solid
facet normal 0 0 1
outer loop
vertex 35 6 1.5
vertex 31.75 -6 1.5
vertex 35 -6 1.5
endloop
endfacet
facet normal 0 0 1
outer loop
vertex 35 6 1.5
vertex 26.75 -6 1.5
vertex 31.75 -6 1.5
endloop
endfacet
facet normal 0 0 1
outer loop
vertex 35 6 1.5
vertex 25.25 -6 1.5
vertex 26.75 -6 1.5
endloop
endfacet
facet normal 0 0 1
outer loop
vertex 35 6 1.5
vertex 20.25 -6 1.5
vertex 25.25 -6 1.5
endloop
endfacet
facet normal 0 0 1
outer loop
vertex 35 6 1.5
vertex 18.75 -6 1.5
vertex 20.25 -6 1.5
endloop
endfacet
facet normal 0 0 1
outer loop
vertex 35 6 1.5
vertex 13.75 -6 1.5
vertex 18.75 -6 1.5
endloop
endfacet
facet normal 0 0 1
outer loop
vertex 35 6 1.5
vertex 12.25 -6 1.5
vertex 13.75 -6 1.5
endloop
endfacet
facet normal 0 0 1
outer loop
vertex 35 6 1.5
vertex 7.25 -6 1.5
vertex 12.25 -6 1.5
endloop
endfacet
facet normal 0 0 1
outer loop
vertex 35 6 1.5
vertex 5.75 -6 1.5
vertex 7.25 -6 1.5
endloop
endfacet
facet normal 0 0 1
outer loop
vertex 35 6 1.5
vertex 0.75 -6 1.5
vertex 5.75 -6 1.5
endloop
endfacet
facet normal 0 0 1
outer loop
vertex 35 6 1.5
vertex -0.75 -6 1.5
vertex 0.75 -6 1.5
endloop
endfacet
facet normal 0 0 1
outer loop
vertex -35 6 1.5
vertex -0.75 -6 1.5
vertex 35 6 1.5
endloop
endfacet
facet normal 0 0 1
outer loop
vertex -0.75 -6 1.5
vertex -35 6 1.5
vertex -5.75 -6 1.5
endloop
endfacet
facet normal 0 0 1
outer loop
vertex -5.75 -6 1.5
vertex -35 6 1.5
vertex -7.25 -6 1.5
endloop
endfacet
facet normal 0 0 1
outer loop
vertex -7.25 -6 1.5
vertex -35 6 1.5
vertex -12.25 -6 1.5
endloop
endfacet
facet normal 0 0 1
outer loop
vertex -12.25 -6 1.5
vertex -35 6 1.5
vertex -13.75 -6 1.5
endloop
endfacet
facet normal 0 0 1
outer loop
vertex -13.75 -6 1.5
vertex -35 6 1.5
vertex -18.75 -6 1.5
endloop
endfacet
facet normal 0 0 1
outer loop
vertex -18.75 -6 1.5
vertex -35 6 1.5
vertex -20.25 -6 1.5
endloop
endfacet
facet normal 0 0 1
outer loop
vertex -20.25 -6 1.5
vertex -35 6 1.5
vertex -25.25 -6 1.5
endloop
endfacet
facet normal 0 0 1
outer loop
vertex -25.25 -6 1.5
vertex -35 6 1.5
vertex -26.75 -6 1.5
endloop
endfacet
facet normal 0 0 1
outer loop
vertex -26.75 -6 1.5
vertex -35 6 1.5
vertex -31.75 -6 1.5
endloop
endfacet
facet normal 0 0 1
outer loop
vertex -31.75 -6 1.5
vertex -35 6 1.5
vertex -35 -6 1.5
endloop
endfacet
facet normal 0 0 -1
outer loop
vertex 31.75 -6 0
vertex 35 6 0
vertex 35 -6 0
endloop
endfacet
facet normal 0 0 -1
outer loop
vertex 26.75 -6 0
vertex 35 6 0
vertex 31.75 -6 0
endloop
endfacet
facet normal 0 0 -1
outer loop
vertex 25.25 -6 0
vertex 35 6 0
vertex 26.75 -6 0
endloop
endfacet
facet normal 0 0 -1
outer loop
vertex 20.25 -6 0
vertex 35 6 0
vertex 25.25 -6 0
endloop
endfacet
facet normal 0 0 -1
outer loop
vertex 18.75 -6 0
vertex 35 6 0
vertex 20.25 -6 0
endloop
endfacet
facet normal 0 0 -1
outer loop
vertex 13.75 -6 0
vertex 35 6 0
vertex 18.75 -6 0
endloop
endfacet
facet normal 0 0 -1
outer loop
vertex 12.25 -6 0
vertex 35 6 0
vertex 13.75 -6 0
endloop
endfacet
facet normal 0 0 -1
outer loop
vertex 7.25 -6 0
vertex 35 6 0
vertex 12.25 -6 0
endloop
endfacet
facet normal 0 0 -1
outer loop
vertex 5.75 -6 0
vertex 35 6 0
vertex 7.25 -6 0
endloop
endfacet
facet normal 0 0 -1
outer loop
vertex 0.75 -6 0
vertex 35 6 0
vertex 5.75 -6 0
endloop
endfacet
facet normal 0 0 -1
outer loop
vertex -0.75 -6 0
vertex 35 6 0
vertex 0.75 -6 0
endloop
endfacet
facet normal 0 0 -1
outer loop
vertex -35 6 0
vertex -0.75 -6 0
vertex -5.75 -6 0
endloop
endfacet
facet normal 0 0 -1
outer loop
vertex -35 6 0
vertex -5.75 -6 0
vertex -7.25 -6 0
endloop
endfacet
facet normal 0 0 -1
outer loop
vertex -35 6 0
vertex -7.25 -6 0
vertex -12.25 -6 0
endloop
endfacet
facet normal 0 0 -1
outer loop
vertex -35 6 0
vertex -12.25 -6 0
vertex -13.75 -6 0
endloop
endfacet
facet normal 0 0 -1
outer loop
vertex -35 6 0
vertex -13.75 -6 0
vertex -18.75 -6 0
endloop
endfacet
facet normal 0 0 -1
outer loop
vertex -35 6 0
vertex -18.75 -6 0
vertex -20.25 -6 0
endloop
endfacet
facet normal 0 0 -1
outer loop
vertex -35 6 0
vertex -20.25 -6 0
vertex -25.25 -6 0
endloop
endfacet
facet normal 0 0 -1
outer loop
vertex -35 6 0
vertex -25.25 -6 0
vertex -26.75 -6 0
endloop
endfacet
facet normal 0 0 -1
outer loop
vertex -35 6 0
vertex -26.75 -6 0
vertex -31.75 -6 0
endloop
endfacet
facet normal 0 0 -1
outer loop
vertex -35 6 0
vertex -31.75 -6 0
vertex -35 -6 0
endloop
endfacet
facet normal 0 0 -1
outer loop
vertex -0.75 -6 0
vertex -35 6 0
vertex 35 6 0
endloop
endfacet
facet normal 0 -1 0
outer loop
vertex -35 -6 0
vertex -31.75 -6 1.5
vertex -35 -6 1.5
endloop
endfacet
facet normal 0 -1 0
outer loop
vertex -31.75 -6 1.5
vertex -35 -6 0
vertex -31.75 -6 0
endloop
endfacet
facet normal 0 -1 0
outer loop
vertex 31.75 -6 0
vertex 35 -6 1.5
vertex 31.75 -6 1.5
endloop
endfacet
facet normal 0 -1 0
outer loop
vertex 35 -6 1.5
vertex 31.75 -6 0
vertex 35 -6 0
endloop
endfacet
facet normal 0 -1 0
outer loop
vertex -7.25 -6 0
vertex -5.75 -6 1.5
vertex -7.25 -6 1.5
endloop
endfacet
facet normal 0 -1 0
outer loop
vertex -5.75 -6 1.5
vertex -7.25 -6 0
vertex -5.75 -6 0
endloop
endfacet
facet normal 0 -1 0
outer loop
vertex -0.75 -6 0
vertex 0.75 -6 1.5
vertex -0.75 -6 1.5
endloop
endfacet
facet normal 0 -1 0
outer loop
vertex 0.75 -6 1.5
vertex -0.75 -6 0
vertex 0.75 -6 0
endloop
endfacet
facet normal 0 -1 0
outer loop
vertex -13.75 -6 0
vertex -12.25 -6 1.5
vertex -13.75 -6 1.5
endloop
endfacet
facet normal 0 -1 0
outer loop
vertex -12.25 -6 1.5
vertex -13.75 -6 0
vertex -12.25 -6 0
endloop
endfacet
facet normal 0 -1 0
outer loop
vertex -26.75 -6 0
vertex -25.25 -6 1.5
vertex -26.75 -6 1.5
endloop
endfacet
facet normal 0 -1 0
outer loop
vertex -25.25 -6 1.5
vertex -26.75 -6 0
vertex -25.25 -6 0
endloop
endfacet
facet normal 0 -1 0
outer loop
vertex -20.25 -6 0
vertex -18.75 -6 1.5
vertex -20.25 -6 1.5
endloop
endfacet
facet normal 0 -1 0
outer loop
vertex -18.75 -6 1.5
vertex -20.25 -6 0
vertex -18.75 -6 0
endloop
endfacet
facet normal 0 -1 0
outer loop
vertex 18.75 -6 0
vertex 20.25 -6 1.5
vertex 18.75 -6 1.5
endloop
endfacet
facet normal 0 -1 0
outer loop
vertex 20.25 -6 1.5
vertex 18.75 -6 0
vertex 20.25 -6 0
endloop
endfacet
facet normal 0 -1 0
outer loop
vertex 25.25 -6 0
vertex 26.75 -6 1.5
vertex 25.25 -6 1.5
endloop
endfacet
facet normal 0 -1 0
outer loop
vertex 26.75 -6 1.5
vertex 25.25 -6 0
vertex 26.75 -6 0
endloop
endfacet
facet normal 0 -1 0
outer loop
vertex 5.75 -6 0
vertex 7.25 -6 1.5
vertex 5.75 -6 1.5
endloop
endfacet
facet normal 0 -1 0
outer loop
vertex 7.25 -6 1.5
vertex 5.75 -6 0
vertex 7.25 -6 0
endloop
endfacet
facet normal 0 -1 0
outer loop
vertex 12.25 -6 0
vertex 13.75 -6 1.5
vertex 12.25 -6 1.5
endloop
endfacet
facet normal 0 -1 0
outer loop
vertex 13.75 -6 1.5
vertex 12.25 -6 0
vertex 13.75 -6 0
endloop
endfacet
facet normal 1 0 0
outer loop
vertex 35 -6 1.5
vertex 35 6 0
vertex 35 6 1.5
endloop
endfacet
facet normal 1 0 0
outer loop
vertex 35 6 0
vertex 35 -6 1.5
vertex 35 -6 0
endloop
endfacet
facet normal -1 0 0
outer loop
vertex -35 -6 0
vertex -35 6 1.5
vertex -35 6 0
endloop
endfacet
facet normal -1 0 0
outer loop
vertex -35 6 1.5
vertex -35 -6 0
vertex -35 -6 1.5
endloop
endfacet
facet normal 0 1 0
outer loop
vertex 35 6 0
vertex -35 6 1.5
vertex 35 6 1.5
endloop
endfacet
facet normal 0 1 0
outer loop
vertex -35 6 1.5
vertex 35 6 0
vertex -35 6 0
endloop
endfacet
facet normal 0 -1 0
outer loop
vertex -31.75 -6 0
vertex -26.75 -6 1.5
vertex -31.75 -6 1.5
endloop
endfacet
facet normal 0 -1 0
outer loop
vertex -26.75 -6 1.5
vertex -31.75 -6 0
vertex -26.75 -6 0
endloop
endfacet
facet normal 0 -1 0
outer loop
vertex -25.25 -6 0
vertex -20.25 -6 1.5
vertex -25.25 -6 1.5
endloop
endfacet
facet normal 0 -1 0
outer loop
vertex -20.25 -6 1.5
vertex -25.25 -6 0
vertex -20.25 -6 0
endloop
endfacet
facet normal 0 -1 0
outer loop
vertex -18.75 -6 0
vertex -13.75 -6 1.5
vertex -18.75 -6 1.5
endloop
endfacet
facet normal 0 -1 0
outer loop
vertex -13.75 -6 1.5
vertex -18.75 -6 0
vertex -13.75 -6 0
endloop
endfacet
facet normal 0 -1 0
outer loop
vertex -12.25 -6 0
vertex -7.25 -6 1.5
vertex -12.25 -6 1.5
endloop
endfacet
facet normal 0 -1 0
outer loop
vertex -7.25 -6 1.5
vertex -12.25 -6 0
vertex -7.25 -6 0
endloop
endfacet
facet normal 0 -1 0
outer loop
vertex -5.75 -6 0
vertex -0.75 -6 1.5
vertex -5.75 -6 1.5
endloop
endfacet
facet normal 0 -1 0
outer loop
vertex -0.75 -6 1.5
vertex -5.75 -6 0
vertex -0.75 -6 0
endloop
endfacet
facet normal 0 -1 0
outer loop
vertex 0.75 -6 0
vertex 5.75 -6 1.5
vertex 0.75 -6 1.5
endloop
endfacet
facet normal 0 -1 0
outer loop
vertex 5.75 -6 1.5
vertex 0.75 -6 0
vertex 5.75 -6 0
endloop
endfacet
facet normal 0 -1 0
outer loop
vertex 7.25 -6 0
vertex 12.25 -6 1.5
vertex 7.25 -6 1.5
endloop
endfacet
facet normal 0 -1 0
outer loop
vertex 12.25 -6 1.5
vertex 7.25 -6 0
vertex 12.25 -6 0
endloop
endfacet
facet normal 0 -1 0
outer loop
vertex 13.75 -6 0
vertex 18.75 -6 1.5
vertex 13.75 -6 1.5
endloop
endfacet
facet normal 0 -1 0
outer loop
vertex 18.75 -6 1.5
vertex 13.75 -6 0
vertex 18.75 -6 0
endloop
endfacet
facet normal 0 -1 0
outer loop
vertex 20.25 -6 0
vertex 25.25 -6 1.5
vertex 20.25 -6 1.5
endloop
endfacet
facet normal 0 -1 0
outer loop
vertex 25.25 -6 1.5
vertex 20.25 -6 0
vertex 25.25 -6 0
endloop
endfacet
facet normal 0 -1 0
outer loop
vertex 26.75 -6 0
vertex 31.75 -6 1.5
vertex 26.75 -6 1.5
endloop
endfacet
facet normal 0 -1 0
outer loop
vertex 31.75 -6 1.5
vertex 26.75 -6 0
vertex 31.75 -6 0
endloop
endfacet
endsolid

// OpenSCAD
// 10-well agarose gel comb, printed lying flat
// Units: mm

// ---------- Parameters ----------
plate_t      = 1.5;    // comb plate thickness (Z)
spine_len    = 70;     // spine length along X
spine_w      = 12;     // spine width along Y
tooth_count  = 10;     // number of teeth
tooth_w      = 5.0;    // tooth width along X
tooth_len    = 12;     // tooth length along Y (from spine edge)
tooth_gap    = 1.5;    // gap between neighbouring teeth (X)
cut_extra    = 0.5;    // overshoot for clean boolean cuts
$fn          = 64;

// ---------- Derived ----------
pitch   = tooth_w + tooth_gap;            // centre-to-centre spacing
x_start = -(tooth_count - 1) * pitch / 2; // first tooth centre (row centred)

// ---------- Model ----------
difference() {
    union() {
        // Spine (back bar)
        translate([-spine_len / 2, -spine_w / 2, 0])
            cube([spine_len, spine_w, plate_t]);

        // Teeth hanging in -Y from the spine edge
        for (i = [0 : tooth_count - 1])
            translate([x_start + i * pitch - tooth_w / 2,
                       -spine_w / 2 - tooth_len,
                       0])
                cube([tooth_w, tooth_len, plate_t]);
    }

    // 10 rectangular wells cut through the plate
    for (i = [0 : tooth_count - 1])
        translate([x_start + i * pitch - tooth_w / 2,
                   -spine_w / 2 - tooth_len,
                   -cut_extra])
            cube([tooth_w, tooth_len, plate_t + 2 * cut_extra]);
}
